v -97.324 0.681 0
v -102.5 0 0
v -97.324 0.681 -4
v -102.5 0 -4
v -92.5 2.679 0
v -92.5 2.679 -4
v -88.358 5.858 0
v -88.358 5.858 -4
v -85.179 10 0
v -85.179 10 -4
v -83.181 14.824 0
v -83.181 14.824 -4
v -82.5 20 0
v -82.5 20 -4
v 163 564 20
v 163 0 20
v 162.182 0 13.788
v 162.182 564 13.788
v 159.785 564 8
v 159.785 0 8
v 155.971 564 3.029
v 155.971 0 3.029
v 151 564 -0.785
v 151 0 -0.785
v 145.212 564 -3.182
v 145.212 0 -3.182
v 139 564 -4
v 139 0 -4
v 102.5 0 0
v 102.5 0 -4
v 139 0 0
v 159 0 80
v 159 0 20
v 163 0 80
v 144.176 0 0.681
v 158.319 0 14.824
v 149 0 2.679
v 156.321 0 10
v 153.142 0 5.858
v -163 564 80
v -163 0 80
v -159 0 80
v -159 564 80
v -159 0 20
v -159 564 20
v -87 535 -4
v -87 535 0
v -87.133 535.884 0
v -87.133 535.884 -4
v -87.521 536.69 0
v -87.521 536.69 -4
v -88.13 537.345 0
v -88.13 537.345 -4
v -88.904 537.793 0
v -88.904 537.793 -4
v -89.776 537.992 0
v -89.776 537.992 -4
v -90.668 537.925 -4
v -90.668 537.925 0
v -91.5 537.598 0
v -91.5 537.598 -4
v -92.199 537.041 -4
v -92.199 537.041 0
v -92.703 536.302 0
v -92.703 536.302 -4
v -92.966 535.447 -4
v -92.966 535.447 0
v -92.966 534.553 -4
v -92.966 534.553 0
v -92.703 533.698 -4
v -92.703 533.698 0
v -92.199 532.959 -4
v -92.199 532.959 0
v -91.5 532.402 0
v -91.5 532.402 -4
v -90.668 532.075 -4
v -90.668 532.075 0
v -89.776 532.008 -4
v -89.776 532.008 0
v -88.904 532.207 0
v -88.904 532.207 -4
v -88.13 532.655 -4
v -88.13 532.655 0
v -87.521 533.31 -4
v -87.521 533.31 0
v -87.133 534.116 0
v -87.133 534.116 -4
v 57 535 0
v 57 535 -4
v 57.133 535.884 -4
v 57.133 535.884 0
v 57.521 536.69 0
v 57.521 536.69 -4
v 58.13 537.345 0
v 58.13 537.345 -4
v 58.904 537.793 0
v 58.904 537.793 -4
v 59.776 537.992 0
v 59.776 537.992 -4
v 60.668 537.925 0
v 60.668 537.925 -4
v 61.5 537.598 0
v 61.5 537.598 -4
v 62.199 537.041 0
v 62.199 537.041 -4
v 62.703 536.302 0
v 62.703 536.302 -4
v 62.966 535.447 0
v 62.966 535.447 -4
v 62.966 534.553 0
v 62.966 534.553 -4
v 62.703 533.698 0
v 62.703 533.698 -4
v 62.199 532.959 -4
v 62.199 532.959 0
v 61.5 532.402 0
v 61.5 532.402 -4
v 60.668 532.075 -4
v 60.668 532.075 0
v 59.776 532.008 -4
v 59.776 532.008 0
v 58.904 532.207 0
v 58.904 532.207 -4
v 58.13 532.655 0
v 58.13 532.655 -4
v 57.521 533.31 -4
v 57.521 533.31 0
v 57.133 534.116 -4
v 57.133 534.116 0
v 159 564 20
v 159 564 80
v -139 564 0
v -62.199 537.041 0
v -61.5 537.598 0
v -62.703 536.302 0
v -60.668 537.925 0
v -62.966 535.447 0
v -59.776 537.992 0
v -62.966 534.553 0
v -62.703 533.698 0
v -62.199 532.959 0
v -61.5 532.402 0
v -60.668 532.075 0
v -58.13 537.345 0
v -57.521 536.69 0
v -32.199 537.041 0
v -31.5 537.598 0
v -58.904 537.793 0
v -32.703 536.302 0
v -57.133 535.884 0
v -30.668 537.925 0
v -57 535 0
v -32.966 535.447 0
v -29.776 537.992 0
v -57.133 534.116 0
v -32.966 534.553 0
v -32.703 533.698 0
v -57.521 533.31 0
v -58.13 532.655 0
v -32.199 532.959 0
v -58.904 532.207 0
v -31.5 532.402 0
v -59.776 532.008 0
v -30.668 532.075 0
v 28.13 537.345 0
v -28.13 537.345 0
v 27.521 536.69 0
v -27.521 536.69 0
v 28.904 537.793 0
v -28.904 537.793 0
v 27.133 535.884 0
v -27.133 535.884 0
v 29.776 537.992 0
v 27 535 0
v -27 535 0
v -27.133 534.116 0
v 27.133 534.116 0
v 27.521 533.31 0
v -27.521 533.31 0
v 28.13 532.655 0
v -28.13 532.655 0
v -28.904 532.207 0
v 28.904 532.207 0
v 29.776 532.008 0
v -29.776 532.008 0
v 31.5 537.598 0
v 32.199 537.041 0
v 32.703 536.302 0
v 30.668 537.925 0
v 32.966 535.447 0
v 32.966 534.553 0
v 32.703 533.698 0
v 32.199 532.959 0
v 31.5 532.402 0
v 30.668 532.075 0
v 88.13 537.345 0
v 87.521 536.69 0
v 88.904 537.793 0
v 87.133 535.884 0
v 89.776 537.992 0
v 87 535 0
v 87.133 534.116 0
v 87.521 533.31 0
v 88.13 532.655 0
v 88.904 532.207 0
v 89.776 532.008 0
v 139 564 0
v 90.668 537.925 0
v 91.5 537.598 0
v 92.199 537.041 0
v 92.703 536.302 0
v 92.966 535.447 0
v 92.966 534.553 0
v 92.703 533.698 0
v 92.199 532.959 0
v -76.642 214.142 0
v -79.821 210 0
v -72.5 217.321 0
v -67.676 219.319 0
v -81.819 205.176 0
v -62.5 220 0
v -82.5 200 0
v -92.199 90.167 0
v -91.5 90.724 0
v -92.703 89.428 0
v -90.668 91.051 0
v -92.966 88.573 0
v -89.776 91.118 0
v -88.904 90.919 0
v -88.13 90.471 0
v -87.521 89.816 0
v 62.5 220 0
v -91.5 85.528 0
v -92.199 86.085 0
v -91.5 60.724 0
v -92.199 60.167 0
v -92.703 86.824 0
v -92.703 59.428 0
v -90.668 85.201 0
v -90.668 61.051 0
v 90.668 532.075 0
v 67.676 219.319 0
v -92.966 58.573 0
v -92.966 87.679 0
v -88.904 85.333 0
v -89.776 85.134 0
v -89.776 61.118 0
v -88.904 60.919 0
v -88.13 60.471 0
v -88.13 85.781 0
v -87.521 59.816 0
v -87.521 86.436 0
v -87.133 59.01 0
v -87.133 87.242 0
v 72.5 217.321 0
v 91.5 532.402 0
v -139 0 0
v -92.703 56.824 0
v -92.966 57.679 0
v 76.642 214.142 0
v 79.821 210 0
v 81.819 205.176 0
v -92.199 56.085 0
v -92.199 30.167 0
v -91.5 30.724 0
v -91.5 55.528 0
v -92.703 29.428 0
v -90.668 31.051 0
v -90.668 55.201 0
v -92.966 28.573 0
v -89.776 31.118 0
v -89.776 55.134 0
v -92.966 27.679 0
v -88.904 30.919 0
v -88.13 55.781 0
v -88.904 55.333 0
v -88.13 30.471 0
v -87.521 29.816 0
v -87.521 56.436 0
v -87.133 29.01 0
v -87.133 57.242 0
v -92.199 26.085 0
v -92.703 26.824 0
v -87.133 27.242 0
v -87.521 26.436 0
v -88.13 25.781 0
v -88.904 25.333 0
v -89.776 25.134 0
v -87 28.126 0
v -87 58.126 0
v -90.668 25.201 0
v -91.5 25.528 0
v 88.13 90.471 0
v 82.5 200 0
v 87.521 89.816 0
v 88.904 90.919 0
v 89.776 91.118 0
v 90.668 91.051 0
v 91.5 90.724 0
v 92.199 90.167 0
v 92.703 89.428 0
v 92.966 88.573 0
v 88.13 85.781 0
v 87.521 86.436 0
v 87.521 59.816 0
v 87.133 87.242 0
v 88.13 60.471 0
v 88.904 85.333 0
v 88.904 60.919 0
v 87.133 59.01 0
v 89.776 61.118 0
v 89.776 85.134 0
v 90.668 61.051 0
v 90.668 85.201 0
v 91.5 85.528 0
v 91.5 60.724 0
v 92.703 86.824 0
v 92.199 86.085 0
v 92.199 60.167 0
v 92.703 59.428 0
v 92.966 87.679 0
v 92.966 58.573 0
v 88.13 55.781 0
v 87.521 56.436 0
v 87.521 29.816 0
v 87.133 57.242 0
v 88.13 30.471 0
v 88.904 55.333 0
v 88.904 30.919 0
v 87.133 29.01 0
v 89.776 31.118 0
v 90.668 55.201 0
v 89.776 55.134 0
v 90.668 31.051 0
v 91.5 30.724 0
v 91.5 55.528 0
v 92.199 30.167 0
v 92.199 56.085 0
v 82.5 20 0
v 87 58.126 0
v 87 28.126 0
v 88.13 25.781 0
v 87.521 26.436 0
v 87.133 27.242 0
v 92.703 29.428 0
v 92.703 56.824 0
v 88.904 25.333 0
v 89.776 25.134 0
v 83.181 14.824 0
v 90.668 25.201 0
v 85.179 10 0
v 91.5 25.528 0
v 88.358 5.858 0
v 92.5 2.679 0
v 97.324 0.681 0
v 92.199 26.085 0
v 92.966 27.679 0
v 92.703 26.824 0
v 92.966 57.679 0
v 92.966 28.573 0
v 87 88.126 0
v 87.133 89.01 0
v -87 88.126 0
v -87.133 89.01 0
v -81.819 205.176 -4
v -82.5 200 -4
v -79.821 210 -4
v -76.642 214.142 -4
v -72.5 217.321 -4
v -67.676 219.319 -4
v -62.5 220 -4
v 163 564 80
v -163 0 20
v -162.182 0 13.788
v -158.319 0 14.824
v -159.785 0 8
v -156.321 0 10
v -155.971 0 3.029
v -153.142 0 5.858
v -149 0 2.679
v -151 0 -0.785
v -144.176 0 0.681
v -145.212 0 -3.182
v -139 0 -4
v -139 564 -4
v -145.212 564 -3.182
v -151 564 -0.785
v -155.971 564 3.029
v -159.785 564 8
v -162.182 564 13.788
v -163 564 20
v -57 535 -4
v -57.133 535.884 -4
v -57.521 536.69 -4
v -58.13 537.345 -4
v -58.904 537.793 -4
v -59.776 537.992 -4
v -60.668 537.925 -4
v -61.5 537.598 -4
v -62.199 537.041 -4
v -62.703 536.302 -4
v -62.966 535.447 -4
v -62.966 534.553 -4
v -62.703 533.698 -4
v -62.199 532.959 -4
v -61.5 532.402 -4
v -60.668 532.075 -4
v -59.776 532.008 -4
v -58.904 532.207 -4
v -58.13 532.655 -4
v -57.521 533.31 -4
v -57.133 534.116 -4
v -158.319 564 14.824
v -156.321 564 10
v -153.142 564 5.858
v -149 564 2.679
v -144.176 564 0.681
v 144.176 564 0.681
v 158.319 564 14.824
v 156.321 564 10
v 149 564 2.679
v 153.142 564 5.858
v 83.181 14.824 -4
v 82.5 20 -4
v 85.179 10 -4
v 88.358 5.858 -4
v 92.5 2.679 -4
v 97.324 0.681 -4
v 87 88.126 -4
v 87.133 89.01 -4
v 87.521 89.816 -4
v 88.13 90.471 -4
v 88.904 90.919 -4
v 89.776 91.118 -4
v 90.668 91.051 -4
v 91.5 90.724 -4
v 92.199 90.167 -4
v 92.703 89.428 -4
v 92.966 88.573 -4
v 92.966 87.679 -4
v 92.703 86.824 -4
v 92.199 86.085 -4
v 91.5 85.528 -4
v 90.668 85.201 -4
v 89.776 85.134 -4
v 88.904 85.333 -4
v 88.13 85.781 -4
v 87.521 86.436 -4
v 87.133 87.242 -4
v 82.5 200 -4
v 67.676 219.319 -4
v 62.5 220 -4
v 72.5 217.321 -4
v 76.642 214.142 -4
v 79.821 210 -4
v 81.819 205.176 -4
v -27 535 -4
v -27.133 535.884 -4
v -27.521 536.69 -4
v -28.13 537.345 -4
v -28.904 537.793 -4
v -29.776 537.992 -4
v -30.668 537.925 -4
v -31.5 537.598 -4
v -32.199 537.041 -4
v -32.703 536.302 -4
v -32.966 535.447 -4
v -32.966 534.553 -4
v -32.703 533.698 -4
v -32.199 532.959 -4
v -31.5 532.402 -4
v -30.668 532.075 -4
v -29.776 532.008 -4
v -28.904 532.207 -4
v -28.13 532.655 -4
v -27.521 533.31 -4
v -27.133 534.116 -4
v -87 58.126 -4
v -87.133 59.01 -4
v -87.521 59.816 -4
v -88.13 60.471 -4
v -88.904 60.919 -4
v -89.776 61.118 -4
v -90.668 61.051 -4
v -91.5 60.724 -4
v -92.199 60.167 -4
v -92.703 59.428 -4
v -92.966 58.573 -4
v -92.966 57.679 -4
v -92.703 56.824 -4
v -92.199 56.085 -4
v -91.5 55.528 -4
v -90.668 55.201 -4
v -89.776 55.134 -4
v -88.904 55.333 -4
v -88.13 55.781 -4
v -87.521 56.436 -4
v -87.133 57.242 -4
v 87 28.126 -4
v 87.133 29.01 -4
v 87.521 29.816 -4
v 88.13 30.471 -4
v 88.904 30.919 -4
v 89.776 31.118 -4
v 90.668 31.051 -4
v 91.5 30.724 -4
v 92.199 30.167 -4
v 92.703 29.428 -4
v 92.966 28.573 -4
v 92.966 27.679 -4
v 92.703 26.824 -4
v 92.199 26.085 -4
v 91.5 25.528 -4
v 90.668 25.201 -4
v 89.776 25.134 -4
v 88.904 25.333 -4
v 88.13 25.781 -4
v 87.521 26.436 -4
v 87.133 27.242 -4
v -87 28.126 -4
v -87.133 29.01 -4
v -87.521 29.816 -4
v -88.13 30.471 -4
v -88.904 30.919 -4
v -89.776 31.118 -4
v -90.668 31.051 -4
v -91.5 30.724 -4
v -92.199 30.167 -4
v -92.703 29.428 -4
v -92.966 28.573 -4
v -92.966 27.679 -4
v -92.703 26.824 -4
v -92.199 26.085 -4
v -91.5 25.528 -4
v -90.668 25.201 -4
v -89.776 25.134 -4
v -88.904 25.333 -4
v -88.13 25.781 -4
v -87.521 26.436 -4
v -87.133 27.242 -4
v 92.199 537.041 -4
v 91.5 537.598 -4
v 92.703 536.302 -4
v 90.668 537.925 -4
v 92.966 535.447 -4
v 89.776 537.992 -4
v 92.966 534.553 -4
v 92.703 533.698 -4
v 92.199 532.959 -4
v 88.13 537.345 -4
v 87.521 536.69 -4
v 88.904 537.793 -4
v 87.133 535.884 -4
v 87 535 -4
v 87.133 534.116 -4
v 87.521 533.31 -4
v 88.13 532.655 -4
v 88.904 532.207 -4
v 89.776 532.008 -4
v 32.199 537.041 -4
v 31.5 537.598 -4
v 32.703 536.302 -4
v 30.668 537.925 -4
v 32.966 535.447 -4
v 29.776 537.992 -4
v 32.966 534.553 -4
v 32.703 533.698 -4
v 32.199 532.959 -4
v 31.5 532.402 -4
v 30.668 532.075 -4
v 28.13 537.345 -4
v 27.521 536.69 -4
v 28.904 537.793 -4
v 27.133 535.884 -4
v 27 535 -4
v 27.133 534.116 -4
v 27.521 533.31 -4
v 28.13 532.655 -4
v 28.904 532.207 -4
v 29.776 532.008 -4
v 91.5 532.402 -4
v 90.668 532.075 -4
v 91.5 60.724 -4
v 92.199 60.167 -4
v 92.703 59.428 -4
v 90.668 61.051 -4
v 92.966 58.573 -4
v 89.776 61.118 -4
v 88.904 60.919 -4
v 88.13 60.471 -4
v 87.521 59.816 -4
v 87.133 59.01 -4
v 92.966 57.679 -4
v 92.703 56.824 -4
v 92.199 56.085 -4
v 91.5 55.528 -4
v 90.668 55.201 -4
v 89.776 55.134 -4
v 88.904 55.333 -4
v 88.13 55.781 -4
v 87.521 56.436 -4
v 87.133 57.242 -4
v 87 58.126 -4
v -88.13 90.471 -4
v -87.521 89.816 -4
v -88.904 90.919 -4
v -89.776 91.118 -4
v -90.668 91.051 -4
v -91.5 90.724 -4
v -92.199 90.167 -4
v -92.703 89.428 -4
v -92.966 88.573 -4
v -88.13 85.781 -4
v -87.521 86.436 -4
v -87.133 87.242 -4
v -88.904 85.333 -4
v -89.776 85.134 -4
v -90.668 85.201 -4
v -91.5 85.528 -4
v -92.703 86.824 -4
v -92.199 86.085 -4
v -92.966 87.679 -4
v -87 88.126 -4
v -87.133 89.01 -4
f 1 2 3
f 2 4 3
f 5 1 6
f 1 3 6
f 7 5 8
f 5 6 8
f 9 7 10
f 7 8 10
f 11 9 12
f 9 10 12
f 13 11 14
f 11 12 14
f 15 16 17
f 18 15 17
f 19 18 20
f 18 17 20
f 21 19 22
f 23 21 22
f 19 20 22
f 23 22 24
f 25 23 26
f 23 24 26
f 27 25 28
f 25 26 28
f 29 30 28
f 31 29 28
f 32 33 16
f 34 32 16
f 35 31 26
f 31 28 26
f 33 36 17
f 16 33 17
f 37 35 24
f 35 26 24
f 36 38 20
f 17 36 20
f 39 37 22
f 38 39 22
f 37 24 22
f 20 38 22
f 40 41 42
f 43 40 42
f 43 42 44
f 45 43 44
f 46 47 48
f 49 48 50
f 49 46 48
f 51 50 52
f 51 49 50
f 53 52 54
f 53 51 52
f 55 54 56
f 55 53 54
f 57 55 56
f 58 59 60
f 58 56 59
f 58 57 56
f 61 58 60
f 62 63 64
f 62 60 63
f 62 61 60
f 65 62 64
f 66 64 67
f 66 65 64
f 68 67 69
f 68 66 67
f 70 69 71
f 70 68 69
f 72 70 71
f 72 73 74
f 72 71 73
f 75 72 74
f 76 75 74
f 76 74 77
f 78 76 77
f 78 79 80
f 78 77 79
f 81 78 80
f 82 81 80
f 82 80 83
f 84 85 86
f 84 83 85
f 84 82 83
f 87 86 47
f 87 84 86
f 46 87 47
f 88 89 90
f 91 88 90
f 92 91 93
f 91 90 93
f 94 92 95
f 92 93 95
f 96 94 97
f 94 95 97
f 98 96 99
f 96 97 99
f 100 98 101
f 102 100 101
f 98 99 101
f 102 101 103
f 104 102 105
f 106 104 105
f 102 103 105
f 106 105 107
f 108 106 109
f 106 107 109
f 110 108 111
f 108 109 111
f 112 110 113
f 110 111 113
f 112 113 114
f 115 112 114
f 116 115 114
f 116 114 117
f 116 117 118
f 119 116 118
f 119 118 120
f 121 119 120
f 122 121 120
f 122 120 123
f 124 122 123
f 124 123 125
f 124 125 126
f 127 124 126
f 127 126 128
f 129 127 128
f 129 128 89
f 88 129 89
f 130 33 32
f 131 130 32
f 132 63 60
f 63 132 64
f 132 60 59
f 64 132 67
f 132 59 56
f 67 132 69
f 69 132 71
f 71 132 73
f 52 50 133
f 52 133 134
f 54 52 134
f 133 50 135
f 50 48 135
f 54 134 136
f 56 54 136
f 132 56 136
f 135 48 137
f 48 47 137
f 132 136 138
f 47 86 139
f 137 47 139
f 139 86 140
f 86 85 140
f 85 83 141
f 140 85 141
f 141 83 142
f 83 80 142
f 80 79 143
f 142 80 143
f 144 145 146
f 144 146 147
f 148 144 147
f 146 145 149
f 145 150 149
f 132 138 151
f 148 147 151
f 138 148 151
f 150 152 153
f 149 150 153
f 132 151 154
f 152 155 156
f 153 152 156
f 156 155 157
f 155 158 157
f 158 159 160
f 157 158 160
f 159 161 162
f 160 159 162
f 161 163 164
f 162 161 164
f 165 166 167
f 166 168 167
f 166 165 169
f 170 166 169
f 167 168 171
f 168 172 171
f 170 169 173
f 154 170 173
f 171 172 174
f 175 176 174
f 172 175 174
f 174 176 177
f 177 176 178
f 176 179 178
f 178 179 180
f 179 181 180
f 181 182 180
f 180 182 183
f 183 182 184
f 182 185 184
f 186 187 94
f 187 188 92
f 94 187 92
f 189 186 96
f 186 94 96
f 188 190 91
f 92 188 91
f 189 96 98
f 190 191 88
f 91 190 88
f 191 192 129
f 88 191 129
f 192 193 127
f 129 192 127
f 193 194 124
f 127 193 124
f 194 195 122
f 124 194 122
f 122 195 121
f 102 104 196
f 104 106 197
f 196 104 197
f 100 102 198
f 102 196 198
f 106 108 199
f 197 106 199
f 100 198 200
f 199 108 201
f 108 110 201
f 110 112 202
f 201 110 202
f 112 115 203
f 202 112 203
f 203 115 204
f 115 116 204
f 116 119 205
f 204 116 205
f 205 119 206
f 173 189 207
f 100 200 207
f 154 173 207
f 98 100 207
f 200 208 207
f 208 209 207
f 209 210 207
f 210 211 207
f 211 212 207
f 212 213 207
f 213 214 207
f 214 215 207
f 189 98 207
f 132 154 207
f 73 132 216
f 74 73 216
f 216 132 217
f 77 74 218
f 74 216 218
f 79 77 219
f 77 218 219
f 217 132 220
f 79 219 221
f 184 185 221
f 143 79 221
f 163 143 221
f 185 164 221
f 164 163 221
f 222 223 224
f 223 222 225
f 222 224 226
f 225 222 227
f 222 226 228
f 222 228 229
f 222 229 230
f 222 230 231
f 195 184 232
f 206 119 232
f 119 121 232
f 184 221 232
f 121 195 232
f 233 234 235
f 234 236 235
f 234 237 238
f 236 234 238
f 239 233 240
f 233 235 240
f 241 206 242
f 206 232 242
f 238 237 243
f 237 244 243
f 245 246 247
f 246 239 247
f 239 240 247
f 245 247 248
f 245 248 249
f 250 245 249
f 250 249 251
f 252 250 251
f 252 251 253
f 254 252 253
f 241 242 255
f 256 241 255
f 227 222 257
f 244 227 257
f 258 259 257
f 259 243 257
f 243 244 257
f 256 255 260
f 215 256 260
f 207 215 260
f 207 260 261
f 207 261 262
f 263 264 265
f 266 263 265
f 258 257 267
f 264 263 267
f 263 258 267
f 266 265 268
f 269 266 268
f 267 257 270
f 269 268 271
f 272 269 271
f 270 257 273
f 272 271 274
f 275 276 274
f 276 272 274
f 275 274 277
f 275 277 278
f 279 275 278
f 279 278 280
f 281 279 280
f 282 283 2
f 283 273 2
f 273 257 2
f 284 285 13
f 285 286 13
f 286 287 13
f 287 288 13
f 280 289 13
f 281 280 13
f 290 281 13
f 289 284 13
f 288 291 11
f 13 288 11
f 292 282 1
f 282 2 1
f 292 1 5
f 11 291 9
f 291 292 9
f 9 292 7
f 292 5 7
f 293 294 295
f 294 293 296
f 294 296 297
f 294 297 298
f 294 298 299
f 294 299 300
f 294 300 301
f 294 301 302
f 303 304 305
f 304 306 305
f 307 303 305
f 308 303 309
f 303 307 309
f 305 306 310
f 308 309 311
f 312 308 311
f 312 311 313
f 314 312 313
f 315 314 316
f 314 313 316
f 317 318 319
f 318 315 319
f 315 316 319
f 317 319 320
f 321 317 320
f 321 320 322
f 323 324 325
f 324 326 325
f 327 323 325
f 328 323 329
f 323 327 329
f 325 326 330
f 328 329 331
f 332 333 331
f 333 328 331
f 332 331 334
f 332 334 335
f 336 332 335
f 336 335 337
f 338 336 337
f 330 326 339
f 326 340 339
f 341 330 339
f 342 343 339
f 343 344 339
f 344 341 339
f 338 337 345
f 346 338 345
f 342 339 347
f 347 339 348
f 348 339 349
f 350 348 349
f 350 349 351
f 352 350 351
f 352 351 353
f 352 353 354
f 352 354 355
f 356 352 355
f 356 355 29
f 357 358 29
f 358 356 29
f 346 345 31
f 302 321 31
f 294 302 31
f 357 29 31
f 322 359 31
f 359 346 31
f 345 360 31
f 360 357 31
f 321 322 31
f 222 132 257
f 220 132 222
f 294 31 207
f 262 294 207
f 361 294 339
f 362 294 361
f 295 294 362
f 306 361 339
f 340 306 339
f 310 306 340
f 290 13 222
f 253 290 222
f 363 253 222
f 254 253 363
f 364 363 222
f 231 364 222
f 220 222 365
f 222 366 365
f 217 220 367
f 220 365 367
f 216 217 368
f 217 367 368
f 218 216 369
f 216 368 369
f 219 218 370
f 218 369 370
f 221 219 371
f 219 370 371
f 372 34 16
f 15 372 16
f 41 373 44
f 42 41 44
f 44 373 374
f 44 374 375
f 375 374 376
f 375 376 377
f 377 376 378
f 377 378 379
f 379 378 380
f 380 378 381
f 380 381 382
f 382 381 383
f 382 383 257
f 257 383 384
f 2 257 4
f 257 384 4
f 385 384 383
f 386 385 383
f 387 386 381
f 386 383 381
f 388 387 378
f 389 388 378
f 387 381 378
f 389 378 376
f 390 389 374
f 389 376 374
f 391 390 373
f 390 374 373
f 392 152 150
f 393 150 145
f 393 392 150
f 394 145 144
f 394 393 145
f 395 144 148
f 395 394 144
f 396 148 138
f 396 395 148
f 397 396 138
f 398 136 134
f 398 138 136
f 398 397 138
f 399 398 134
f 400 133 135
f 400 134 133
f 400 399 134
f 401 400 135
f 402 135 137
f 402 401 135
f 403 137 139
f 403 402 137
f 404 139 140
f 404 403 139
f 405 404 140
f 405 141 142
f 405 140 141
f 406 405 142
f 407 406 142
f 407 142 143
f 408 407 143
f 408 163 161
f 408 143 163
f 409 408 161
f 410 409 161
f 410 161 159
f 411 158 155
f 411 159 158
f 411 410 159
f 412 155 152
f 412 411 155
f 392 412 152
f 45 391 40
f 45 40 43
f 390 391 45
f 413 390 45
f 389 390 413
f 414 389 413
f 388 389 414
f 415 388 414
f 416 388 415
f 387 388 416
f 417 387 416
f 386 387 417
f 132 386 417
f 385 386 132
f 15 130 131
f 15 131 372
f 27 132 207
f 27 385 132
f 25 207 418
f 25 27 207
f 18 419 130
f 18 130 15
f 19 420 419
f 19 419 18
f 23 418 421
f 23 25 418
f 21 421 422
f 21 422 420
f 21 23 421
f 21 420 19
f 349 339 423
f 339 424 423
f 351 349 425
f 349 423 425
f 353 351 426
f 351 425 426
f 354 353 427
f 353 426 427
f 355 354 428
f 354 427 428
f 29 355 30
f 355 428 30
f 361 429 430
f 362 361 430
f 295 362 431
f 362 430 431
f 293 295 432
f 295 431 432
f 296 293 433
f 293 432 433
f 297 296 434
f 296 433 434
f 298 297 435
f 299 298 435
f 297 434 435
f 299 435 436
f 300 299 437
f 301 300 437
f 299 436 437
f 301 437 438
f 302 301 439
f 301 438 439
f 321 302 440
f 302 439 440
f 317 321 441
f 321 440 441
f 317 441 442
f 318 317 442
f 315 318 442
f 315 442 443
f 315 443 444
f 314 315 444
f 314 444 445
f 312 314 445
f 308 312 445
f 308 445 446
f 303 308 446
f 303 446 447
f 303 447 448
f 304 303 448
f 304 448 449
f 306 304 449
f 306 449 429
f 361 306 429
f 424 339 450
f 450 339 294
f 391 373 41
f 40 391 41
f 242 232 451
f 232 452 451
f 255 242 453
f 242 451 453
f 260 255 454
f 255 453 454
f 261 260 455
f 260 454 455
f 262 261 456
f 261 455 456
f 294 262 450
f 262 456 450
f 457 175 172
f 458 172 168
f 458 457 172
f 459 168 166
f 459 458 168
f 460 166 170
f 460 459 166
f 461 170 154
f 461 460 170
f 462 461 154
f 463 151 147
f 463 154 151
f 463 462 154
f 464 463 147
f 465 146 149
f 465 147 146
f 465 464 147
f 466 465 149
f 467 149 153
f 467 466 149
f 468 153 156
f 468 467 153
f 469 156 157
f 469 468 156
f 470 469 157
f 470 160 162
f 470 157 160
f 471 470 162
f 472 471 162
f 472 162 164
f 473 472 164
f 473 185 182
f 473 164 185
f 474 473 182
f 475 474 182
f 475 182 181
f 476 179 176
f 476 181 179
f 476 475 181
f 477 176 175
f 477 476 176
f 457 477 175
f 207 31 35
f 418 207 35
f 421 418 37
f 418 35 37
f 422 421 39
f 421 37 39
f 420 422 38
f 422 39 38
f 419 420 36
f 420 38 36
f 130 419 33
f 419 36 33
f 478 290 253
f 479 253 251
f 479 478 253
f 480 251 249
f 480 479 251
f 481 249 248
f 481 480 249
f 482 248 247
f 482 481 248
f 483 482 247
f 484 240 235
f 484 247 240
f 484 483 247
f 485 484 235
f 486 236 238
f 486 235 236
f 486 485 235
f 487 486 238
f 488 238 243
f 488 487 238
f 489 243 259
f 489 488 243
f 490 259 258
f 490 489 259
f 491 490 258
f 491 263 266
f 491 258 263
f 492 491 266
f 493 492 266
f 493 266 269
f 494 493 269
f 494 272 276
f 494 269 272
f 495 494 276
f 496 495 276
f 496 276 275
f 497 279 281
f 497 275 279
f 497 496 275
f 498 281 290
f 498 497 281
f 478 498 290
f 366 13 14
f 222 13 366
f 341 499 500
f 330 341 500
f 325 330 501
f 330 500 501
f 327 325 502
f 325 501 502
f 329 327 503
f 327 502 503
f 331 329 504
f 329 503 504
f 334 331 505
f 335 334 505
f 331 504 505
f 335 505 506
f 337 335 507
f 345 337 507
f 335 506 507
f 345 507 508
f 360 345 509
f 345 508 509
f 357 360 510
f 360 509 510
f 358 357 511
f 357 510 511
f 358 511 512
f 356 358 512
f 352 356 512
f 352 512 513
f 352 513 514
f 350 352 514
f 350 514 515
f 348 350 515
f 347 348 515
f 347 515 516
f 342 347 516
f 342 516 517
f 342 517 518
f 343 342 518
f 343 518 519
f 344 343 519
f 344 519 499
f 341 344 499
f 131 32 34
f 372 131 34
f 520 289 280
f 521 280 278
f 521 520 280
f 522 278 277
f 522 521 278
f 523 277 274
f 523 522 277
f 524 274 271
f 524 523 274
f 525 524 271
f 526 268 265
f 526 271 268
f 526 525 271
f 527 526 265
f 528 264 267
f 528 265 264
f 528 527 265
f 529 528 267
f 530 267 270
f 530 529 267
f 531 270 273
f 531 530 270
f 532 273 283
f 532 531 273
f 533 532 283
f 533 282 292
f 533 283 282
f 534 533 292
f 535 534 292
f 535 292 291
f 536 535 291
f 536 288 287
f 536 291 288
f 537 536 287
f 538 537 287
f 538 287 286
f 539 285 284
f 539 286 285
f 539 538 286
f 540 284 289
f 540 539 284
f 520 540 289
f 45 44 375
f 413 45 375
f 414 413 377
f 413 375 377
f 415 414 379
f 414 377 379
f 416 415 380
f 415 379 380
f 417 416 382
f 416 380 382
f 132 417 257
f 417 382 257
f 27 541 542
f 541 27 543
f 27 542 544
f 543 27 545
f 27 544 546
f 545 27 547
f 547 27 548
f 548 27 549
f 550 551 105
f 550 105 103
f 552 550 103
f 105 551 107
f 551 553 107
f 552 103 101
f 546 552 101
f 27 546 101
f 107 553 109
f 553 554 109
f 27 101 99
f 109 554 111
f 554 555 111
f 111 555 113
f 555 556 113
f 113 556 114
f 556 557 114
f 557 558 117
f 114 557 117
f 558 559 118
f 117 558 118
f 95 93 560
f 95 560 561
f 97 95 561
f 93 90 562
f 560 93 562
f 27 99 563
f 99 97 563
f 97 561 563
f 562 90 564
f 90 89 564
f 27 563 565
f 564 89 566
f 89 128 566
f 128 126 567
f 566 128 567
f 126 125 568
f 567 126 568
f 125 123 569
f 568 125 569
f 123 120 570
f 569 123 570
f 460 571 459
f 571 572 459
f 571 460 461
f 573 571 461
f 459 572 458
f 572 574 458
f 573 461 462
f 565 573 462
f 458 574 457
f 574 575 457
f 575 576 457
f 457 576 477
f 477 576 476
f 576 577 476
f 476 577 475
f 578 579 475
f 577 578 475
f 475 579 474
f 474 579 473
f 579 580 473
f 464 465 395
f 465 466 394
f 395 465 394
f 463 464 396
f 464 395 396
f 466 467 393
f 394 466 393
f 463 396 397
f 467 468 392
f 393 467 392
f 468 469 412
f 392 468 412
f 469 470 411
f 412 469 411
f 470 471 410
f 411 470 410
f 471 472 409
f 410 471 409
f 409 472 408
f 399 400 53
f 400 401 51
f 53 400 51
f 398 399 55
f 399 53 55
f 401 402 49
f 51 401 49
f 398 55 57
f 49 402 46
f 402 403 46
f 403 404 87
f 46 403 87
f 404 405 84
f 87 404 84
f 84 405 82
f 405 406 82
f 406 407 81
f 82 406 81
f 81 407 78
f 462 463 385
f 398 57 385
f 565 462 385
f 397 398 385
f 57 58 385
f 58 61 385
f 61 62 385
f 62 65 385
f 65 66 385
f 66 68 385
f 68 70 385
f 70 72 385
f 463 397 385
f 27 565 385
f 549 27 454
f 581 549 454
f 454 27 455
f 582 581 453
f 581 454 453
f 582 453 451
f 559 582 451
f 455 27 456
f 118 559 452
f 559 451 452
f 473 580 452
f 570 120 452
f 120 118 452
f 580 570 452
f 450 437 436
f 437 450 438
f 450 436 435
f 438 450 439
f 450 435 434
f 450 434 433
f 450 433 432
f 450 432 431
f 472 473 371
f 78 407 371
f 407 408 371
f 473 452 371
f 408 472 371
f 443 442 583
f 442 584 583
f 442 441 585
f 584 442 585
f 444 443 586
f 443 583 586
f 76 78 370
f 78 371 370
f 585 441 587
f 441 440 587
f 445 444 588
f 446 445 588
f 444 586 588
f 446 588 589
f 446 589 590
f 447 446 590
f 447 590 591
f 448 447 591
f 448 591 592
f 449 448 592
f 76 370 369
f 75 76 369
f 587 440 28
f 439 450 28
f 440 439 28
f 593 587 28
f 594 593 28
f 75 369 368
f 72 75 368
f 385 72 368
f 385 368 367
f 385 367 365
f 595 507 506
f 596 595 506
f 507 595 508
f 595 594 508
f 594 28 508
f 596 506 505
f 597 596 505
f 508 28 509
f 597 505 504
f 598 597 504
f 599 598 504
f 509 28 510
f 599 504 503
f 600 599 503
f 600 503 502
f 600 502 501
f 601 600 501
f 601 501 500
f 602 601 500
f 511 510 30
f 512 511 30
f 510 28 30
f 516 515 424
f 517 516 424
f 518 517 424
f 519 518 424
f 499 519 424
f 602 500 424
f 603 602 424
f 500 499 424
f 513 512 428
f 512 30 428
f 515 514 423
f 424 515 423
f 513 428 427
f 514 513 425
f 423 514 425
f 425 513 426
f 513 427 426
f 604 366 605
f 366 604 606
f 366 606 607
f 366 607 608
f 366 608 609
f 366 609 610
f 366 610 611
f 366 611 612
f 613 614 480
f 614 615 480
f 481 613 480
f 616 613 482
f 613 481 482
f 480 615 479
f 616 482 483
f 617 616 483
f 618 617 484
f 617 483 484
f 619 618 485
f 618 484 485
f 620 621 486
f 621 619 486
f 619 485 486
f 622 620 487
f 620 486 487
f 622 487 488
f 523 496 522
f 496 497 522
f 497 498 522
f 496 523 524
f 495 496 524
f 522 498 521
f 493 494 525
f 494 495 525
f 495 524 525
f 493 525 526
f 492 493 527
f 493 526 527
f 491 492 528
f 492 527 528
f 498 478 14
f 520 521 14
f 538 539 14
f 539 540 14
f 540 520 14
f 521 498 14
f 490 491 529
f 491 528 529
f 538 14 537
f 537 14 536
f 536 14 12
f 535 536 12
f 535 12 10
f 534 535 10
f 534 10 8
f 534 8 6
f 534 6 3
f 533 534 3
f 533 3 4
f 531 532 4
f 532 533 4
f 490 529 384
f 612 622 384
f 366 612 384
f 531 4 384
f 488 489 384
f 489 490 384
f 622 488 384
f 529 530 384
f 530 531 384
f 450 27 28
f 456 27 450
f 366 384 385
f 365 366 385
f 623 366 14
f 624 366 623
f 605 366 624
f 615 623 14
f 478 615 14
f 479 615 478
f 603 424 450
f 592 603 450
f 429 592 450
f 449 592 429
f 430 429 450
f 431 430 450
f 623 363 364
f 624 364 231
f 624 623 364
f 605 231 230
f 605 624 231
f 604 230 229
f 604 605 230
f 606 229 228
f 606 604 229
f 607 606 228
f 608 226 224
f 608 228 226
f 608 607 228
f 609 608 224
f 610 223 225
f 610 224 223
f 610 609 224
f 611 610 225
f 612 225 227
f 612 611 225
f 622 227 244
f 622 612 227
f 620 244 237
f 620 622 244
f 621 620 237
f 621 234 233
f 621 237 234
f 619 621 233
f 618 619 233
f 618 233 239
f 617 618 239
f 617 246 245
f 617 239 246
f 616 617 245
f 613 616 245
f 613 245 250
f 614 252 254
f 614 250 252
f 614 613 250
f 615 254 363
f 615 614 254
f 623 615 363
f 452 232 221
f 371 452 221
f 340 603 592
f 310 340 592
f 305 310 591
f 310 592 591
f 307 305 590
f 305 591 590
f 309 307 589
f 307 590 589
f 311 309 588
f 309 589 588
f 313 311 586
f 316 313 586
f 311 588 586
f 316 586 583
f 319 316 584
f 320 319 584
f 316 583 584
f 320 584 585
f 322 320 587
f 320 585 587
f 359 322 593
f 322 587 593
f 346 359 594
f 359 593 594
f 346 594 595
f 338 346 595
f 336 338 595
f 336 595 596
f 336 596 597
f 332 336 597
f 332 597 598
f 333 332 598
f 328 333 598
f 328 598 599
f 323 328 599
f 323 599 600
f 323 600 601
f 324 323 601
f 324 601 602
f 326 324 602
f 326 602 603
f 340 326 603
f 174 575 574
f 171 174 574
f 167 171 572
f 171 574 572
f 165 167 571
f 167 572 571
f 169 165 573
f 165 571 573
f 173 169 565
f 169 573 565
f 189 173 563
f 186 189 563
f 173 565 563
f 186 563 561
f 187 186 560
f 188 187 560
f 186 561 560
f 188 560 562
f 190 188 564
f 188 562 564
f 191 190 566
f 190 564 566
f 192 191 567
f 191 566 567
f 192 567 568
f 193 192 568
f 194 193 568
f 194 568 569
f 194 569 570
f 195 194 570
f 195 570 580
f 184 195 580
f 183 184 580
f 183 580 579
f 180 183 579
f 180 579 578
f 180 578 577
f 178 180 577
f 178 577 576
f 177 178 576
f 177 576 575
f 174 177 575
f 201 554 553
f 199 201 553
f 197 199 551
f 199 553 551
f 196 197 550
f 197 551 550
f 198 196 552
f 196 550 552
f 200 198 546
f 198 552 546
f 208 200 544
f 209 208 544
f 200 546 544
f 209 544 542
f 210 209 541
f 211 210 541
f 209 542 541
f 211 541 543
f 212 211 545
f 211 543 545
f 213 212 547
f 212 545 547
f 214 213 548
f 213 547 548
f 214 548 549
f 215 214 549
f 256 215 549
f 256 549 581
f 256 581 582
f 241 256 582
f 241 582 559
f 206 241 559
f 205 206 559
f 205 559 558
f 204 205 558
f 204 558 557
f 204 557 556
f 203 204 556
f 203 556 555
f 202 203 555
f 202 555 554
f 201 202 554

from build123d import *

# Parameters (mm, degrees)
EXTRUDE_THIN1_DEPTH     = 564
CUT_EXTRUDE2_DEPTH      = 594.060705156
CUT_EXTRUDE2_DEPTH_BACK = 594.060705156
SKETCH3_W               = 165
SKETCH3_H               = 220
FILLET1_R               = 20
SKETCH4_R               = 3
CUT_EXTRUDE3_DEPTH      = 594.060705156


with BuildPart() as part:
    # Sketch1 → Extrude-Thin1 (new body)
    with BuildSketch(Plane(origin=(0, 0, 0), x_dir=(1, 0, 0), z_dir=(0, 1, 0))):
        with BuildLine():
            Line((-159, -80), (-159, -20))
            ThreePointArc((-159, -20), (-153.142135624, -5.857864376), (-139, 0))
            Line((-139, 0), (139, 0))
            ThreePointArc((139, 0), (153.142135624, -5.857864376), (159, -20))
            Line((159, -20), (159, -80))
            Line((159, -80), (163, -80))
            Line((163, -80), (163, -20))
            ThreePointArc((163, -20), (155.970562748, -3.029437252), (139, 4))
            Line((139, 4), (-139, 4))
            ThreePointArc((-139, 4), (-155.970562748, -3.029437252), (-163, -20))
            Line((-163, -20), (-163, -80))
            Line((-163, -80), (-159, -80))
        make_face()
    extrude(amount=EXTRUDE_THIN1_DEPTH)

    # Sketch3 → Cut-Extrude2 (cut, two sides: drawn at the far end of the back side and taken through both)
    with BuildSketch(Plane(origin=(0, 0, -4), x_dir=(-1, 0, 0), z_dir=(0, 0, -1)).offset(-CUT_EXTRUDE2_DEPTH_BACK)):
        with Locations((0, 110)):
            Rectangle(SKETCH3_W, SKETCH3_H)
    extrude(amount=CUT_EXTRUDE2_DEPTH + CUT_EXTRUDE2_DEPTH_BACK, mode=Mode.SUBTRACT)

    # Fillet1
    fillet1_edges = [part.edges().sort_by_distance(p)[0] for p in [
        (-82.5, 0, -2),
        (82.5, 0, -2),
        (82.5, 220, -2),
        (-82.5, 220, -2),
    ]]
    fillet(fillet1_edges, radius=FILLET1_R)

    # Sketch4 → Cut-Extrude3 (cut, through all)
    with BuildSketch(Plane(origin=(0, 0, -4), x_dir=(-1, 0, 0), z_dir=(0, 0, -1))):
        with Locations((-90, 535)):
            Circle(SKETCH4_R)
        with Locations((-60, 535)):
            Circle(SKETCH4_R)
        with Locations((-30, 535)):
            Circle(SKETCH4_R)
        with Locations((-90, 88.126)):
            Circle(SKETCH4_R)
        with Locations((-90, 58.126)):
            Circle(SKETCH4_R)
        with Locations((-90, 28.126)):
            Circle(SKETCH4_R)
    cut_extrude3 = extrude(amount=-CUT_EXTRUDE3_DEPTH, mode=Mode.SUBTRACT)

    # Mirror1: Cut-Extrude3 across plane
    add(cut_extrude3.mirror(Plane(origin=(0, 0, 0), x_dir=(0, 0, 1), z_dir=(1, 0, 0))), mode=Mode.SUBTRACT)


solid = part.part
